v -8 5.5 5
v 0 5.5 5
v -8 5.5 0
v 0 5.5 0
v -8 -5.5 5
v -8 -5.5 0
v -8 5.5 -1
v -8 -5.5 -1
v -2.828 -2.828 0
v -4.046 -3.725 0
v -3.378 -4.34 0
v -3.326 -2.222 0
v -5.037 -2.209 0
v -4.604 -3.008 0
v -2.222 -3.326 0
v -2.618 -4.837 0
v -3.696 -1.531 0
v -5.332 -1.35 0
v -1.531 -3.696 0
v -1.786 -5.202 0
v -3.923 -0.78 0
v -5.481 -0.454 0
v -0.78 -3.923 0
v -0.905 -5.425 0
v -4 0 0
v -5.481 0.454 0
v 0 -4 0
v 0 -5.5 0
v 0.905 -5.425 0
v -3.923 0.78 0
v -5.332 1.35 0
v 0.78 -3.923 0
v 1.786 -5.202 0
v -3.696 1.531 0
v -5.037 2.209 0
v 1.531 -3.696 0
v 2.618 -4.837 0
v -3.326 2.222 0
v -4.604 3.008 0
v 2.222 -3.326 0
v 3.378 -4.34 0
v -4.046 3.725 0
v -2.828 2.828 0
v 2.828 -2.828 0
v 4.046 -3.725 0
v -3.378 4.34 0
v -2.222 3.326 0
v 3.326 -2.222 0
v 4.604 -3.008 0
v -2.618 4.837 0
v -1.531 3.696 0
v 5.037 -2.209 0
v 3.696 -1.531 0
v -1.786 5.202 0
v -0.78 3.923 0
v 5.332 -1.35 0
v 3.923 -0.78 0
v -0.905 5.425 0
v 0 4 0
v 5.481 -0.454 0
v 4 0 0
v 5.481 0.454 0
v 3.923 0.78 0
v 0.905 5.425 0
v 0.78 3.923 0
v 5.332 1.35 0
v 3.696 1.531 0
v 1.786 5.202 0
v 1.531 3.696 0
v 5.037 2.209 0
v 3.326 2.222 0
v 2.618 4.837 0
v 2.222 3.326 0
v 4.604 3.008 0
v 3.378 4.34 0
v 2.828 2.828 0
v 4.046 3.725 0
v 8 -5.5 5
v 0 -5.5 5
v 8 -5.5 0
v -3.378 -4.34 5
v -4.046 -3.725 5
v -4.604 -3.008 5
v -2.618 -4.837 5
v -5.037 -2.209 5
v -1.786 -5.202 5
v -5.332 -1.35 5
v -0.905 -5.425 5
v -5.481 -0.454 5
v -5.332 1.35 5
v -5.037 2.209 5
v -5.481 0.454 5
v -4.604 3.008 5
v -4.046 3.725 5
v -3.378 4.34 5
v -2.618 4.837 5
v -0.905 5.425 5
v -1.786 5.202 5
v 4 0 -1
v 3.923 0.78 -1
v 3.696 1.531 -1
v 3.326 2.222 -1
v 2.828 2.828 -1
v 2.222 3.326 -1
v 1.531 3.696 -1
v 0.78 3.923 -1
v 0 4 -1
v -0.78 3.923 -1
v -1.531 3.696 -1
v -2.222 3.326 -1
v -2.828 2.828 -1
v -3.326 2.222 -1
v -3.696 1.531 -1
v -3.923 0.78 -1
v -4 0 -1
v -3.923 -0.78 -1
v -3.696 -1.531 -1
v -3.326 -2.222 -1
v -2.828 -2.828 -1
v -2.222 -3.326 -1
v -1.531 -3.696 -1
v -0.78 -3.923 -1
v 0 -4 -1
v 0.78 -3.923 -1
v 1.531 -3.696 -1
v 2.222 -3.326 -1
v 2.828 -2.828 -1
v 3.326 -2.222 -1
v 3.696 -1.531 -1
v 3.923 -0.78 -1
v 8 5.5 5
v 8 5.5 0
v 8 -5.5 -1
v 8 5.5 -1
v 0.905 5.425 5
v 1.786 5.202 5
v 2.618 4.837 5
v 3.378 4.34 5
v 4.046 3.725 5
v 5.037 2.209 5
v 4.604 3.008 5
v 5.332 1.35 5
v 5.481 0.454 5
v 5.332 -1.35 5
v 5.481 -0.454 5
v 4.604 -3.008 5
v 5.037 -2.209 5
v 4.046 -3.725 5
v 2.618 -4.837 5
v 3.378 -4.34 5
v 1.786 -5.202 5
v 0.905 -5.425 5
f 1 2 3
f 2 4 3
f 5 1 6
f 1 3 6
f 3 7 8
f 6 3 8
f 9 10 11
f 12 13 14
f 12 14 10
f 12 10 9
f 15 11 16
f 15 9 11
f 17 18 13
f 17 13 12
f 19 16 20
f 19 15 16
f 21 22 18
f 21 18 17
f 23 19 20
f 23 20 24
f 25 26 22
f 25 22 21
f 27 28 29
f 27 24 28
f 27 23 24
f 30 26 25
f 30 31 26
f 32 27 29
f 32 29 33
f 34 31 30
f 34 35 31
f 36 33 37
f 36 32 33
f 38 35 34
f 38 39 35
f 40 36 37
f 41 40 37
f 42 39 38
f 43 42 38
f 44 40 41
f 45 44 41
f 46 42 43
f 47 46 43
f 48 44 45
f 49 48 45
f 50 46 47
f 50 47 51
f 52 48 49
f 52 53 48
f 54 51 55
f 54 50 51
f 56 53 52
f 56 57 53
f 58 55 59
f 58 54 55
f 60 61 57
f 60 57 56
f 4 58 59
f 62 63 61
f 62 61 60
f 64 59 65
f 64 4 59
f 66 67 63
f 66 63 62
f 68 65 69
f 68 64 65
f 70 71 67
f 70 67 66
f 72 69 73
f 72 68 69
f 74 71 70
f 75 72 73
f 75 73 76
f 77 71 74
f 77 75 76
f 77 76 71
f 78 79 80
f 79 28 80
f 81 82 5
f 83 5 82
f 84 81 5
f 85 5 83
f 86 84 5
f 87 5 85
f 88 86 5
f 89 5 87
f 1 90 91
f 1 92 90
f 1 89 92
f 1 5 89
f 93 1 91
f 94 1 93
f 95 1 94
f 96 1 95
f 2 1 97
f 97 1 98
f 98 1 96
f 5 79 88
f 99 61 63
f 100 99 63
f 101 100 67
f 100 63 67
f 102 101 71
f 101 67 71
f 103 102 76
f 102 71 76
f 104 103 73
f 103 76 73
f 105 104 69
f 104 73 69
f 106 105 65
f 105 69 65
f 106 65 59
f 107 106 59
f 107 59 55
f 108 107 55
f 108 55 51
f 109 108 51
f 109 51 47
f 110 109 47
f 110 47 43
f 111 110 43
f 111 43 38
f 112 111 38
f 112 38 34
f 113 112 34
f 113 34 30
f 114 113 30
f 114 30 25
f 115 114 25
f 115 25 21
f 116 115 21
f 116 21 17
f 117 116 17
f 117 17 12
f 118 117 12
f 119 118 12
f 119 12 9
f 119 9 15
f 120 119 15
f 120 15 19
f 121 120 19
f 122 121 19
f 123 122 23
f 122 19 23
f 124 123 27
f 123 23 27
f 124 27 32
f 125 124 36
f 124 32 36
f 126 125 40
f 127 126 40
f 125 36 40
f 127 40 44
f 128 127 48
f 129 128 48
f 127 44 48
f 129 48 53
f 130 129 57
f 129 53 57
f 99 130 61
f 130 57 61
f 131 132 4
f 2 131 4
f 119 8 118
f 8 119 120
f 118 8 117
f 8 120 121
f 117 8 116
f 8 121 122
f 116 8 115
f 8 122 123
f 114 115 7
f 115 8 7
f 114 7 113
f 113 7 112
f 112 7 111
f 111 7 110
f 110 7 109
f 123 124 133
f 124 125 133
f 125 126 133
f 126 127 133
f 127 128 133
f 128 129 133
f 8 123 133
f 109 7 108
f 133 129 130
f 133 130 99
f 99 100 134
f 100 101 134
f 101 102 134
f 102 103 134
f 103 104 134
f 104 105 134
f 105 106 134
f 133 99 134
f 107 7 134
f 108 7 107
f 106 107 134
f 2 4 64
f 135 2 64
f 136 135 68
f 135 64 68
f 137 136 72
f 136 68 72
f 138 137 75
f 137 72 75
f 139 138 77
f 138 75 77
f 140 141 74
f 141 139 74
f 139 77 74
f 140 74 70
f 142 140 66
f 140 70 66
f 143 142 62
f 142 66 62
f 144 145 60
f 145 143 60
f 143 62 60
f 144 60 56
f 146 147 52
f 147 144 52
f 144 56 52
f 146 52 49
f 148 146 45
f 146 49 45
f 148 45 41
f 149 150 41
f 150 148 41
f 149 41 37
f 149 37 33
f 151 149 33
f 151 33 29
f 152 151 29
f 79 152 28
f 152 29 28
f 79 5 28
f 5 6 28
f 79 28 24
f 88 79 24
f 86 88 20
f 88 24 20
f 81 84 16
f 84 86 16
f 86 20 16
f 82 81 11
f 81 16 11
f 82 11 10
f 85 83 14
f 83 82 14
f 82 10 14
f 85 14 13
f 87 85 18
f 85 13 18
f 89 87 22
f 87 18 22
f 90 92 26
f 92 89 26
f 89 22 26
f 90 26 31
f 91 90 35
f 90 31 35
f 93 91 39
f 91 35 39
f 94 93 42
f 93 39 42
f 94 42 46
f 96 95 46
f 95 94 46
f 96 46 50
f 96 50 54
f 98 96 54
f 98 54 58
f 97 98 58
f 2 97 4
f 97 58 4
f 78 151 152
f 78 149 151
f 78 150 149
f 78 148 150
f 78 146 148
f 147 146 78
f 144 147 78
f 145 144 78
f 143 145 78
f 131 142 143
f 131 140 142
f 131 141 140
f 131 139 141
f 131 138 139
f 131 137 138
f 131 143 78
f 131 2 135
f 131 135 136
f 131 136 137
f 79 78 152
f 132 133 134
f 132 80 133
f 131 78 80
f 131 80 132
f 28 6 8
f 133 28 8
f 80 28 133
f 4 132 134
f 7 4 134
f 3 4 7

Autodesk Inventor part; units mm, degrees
ref_plane "YZ Plane" through (0, 0, 0) normal (1, 0, 0) x (0, 1, 0)
ref_plane "XZ Plane" through (0, 0, 0) normal (0, 1, 0) x (-1, 0, 0)
ref_plane "XY Plane" through (0, 0, 0) normal (0, 0, 1) x (1, 0, 0)
sketch "Skizze1" plane through (0, 0, 0) normal (0, 0, 1) x (1, 0, 0)
  line L0 (-8, -5.5) -> (8, -5.5)
  line L1 (8, -5.5) -> (8, 5.5)
  line L2 (8, 5.5) -> (-8, 5.5)
  line L3 (-8, 5.5) -> (-8, -5.5)
  line L4 (-8, -5.5) -> (8, 5.5) construction
  line L5 (8, -5.5) -> (-8, 5.5) construction
  circle A0 centre (0, 0) radius 5.5
  circle A1 centre (0, 0) radius 4
  dimension "d0" = 11
  dimension "d1" = 16
  dimension "d6" = 8
extrude "Extrusion1" add sketch "Skizze1" along normal blind 5 contours L3 L2 A0 L0 | A0 L2 L1 L0
extrude "Extrusion2" add sketch "Skizze1" against normal blind 1 contours L3 L2 A0 L0 | A0 L2 L1 L0 | A0 | A1
extrude "Extrusion3" cut sketch "Skizze1" against normal through all contours A1
properties part number "rotSpanner" material "ABS-Kunststoff"
